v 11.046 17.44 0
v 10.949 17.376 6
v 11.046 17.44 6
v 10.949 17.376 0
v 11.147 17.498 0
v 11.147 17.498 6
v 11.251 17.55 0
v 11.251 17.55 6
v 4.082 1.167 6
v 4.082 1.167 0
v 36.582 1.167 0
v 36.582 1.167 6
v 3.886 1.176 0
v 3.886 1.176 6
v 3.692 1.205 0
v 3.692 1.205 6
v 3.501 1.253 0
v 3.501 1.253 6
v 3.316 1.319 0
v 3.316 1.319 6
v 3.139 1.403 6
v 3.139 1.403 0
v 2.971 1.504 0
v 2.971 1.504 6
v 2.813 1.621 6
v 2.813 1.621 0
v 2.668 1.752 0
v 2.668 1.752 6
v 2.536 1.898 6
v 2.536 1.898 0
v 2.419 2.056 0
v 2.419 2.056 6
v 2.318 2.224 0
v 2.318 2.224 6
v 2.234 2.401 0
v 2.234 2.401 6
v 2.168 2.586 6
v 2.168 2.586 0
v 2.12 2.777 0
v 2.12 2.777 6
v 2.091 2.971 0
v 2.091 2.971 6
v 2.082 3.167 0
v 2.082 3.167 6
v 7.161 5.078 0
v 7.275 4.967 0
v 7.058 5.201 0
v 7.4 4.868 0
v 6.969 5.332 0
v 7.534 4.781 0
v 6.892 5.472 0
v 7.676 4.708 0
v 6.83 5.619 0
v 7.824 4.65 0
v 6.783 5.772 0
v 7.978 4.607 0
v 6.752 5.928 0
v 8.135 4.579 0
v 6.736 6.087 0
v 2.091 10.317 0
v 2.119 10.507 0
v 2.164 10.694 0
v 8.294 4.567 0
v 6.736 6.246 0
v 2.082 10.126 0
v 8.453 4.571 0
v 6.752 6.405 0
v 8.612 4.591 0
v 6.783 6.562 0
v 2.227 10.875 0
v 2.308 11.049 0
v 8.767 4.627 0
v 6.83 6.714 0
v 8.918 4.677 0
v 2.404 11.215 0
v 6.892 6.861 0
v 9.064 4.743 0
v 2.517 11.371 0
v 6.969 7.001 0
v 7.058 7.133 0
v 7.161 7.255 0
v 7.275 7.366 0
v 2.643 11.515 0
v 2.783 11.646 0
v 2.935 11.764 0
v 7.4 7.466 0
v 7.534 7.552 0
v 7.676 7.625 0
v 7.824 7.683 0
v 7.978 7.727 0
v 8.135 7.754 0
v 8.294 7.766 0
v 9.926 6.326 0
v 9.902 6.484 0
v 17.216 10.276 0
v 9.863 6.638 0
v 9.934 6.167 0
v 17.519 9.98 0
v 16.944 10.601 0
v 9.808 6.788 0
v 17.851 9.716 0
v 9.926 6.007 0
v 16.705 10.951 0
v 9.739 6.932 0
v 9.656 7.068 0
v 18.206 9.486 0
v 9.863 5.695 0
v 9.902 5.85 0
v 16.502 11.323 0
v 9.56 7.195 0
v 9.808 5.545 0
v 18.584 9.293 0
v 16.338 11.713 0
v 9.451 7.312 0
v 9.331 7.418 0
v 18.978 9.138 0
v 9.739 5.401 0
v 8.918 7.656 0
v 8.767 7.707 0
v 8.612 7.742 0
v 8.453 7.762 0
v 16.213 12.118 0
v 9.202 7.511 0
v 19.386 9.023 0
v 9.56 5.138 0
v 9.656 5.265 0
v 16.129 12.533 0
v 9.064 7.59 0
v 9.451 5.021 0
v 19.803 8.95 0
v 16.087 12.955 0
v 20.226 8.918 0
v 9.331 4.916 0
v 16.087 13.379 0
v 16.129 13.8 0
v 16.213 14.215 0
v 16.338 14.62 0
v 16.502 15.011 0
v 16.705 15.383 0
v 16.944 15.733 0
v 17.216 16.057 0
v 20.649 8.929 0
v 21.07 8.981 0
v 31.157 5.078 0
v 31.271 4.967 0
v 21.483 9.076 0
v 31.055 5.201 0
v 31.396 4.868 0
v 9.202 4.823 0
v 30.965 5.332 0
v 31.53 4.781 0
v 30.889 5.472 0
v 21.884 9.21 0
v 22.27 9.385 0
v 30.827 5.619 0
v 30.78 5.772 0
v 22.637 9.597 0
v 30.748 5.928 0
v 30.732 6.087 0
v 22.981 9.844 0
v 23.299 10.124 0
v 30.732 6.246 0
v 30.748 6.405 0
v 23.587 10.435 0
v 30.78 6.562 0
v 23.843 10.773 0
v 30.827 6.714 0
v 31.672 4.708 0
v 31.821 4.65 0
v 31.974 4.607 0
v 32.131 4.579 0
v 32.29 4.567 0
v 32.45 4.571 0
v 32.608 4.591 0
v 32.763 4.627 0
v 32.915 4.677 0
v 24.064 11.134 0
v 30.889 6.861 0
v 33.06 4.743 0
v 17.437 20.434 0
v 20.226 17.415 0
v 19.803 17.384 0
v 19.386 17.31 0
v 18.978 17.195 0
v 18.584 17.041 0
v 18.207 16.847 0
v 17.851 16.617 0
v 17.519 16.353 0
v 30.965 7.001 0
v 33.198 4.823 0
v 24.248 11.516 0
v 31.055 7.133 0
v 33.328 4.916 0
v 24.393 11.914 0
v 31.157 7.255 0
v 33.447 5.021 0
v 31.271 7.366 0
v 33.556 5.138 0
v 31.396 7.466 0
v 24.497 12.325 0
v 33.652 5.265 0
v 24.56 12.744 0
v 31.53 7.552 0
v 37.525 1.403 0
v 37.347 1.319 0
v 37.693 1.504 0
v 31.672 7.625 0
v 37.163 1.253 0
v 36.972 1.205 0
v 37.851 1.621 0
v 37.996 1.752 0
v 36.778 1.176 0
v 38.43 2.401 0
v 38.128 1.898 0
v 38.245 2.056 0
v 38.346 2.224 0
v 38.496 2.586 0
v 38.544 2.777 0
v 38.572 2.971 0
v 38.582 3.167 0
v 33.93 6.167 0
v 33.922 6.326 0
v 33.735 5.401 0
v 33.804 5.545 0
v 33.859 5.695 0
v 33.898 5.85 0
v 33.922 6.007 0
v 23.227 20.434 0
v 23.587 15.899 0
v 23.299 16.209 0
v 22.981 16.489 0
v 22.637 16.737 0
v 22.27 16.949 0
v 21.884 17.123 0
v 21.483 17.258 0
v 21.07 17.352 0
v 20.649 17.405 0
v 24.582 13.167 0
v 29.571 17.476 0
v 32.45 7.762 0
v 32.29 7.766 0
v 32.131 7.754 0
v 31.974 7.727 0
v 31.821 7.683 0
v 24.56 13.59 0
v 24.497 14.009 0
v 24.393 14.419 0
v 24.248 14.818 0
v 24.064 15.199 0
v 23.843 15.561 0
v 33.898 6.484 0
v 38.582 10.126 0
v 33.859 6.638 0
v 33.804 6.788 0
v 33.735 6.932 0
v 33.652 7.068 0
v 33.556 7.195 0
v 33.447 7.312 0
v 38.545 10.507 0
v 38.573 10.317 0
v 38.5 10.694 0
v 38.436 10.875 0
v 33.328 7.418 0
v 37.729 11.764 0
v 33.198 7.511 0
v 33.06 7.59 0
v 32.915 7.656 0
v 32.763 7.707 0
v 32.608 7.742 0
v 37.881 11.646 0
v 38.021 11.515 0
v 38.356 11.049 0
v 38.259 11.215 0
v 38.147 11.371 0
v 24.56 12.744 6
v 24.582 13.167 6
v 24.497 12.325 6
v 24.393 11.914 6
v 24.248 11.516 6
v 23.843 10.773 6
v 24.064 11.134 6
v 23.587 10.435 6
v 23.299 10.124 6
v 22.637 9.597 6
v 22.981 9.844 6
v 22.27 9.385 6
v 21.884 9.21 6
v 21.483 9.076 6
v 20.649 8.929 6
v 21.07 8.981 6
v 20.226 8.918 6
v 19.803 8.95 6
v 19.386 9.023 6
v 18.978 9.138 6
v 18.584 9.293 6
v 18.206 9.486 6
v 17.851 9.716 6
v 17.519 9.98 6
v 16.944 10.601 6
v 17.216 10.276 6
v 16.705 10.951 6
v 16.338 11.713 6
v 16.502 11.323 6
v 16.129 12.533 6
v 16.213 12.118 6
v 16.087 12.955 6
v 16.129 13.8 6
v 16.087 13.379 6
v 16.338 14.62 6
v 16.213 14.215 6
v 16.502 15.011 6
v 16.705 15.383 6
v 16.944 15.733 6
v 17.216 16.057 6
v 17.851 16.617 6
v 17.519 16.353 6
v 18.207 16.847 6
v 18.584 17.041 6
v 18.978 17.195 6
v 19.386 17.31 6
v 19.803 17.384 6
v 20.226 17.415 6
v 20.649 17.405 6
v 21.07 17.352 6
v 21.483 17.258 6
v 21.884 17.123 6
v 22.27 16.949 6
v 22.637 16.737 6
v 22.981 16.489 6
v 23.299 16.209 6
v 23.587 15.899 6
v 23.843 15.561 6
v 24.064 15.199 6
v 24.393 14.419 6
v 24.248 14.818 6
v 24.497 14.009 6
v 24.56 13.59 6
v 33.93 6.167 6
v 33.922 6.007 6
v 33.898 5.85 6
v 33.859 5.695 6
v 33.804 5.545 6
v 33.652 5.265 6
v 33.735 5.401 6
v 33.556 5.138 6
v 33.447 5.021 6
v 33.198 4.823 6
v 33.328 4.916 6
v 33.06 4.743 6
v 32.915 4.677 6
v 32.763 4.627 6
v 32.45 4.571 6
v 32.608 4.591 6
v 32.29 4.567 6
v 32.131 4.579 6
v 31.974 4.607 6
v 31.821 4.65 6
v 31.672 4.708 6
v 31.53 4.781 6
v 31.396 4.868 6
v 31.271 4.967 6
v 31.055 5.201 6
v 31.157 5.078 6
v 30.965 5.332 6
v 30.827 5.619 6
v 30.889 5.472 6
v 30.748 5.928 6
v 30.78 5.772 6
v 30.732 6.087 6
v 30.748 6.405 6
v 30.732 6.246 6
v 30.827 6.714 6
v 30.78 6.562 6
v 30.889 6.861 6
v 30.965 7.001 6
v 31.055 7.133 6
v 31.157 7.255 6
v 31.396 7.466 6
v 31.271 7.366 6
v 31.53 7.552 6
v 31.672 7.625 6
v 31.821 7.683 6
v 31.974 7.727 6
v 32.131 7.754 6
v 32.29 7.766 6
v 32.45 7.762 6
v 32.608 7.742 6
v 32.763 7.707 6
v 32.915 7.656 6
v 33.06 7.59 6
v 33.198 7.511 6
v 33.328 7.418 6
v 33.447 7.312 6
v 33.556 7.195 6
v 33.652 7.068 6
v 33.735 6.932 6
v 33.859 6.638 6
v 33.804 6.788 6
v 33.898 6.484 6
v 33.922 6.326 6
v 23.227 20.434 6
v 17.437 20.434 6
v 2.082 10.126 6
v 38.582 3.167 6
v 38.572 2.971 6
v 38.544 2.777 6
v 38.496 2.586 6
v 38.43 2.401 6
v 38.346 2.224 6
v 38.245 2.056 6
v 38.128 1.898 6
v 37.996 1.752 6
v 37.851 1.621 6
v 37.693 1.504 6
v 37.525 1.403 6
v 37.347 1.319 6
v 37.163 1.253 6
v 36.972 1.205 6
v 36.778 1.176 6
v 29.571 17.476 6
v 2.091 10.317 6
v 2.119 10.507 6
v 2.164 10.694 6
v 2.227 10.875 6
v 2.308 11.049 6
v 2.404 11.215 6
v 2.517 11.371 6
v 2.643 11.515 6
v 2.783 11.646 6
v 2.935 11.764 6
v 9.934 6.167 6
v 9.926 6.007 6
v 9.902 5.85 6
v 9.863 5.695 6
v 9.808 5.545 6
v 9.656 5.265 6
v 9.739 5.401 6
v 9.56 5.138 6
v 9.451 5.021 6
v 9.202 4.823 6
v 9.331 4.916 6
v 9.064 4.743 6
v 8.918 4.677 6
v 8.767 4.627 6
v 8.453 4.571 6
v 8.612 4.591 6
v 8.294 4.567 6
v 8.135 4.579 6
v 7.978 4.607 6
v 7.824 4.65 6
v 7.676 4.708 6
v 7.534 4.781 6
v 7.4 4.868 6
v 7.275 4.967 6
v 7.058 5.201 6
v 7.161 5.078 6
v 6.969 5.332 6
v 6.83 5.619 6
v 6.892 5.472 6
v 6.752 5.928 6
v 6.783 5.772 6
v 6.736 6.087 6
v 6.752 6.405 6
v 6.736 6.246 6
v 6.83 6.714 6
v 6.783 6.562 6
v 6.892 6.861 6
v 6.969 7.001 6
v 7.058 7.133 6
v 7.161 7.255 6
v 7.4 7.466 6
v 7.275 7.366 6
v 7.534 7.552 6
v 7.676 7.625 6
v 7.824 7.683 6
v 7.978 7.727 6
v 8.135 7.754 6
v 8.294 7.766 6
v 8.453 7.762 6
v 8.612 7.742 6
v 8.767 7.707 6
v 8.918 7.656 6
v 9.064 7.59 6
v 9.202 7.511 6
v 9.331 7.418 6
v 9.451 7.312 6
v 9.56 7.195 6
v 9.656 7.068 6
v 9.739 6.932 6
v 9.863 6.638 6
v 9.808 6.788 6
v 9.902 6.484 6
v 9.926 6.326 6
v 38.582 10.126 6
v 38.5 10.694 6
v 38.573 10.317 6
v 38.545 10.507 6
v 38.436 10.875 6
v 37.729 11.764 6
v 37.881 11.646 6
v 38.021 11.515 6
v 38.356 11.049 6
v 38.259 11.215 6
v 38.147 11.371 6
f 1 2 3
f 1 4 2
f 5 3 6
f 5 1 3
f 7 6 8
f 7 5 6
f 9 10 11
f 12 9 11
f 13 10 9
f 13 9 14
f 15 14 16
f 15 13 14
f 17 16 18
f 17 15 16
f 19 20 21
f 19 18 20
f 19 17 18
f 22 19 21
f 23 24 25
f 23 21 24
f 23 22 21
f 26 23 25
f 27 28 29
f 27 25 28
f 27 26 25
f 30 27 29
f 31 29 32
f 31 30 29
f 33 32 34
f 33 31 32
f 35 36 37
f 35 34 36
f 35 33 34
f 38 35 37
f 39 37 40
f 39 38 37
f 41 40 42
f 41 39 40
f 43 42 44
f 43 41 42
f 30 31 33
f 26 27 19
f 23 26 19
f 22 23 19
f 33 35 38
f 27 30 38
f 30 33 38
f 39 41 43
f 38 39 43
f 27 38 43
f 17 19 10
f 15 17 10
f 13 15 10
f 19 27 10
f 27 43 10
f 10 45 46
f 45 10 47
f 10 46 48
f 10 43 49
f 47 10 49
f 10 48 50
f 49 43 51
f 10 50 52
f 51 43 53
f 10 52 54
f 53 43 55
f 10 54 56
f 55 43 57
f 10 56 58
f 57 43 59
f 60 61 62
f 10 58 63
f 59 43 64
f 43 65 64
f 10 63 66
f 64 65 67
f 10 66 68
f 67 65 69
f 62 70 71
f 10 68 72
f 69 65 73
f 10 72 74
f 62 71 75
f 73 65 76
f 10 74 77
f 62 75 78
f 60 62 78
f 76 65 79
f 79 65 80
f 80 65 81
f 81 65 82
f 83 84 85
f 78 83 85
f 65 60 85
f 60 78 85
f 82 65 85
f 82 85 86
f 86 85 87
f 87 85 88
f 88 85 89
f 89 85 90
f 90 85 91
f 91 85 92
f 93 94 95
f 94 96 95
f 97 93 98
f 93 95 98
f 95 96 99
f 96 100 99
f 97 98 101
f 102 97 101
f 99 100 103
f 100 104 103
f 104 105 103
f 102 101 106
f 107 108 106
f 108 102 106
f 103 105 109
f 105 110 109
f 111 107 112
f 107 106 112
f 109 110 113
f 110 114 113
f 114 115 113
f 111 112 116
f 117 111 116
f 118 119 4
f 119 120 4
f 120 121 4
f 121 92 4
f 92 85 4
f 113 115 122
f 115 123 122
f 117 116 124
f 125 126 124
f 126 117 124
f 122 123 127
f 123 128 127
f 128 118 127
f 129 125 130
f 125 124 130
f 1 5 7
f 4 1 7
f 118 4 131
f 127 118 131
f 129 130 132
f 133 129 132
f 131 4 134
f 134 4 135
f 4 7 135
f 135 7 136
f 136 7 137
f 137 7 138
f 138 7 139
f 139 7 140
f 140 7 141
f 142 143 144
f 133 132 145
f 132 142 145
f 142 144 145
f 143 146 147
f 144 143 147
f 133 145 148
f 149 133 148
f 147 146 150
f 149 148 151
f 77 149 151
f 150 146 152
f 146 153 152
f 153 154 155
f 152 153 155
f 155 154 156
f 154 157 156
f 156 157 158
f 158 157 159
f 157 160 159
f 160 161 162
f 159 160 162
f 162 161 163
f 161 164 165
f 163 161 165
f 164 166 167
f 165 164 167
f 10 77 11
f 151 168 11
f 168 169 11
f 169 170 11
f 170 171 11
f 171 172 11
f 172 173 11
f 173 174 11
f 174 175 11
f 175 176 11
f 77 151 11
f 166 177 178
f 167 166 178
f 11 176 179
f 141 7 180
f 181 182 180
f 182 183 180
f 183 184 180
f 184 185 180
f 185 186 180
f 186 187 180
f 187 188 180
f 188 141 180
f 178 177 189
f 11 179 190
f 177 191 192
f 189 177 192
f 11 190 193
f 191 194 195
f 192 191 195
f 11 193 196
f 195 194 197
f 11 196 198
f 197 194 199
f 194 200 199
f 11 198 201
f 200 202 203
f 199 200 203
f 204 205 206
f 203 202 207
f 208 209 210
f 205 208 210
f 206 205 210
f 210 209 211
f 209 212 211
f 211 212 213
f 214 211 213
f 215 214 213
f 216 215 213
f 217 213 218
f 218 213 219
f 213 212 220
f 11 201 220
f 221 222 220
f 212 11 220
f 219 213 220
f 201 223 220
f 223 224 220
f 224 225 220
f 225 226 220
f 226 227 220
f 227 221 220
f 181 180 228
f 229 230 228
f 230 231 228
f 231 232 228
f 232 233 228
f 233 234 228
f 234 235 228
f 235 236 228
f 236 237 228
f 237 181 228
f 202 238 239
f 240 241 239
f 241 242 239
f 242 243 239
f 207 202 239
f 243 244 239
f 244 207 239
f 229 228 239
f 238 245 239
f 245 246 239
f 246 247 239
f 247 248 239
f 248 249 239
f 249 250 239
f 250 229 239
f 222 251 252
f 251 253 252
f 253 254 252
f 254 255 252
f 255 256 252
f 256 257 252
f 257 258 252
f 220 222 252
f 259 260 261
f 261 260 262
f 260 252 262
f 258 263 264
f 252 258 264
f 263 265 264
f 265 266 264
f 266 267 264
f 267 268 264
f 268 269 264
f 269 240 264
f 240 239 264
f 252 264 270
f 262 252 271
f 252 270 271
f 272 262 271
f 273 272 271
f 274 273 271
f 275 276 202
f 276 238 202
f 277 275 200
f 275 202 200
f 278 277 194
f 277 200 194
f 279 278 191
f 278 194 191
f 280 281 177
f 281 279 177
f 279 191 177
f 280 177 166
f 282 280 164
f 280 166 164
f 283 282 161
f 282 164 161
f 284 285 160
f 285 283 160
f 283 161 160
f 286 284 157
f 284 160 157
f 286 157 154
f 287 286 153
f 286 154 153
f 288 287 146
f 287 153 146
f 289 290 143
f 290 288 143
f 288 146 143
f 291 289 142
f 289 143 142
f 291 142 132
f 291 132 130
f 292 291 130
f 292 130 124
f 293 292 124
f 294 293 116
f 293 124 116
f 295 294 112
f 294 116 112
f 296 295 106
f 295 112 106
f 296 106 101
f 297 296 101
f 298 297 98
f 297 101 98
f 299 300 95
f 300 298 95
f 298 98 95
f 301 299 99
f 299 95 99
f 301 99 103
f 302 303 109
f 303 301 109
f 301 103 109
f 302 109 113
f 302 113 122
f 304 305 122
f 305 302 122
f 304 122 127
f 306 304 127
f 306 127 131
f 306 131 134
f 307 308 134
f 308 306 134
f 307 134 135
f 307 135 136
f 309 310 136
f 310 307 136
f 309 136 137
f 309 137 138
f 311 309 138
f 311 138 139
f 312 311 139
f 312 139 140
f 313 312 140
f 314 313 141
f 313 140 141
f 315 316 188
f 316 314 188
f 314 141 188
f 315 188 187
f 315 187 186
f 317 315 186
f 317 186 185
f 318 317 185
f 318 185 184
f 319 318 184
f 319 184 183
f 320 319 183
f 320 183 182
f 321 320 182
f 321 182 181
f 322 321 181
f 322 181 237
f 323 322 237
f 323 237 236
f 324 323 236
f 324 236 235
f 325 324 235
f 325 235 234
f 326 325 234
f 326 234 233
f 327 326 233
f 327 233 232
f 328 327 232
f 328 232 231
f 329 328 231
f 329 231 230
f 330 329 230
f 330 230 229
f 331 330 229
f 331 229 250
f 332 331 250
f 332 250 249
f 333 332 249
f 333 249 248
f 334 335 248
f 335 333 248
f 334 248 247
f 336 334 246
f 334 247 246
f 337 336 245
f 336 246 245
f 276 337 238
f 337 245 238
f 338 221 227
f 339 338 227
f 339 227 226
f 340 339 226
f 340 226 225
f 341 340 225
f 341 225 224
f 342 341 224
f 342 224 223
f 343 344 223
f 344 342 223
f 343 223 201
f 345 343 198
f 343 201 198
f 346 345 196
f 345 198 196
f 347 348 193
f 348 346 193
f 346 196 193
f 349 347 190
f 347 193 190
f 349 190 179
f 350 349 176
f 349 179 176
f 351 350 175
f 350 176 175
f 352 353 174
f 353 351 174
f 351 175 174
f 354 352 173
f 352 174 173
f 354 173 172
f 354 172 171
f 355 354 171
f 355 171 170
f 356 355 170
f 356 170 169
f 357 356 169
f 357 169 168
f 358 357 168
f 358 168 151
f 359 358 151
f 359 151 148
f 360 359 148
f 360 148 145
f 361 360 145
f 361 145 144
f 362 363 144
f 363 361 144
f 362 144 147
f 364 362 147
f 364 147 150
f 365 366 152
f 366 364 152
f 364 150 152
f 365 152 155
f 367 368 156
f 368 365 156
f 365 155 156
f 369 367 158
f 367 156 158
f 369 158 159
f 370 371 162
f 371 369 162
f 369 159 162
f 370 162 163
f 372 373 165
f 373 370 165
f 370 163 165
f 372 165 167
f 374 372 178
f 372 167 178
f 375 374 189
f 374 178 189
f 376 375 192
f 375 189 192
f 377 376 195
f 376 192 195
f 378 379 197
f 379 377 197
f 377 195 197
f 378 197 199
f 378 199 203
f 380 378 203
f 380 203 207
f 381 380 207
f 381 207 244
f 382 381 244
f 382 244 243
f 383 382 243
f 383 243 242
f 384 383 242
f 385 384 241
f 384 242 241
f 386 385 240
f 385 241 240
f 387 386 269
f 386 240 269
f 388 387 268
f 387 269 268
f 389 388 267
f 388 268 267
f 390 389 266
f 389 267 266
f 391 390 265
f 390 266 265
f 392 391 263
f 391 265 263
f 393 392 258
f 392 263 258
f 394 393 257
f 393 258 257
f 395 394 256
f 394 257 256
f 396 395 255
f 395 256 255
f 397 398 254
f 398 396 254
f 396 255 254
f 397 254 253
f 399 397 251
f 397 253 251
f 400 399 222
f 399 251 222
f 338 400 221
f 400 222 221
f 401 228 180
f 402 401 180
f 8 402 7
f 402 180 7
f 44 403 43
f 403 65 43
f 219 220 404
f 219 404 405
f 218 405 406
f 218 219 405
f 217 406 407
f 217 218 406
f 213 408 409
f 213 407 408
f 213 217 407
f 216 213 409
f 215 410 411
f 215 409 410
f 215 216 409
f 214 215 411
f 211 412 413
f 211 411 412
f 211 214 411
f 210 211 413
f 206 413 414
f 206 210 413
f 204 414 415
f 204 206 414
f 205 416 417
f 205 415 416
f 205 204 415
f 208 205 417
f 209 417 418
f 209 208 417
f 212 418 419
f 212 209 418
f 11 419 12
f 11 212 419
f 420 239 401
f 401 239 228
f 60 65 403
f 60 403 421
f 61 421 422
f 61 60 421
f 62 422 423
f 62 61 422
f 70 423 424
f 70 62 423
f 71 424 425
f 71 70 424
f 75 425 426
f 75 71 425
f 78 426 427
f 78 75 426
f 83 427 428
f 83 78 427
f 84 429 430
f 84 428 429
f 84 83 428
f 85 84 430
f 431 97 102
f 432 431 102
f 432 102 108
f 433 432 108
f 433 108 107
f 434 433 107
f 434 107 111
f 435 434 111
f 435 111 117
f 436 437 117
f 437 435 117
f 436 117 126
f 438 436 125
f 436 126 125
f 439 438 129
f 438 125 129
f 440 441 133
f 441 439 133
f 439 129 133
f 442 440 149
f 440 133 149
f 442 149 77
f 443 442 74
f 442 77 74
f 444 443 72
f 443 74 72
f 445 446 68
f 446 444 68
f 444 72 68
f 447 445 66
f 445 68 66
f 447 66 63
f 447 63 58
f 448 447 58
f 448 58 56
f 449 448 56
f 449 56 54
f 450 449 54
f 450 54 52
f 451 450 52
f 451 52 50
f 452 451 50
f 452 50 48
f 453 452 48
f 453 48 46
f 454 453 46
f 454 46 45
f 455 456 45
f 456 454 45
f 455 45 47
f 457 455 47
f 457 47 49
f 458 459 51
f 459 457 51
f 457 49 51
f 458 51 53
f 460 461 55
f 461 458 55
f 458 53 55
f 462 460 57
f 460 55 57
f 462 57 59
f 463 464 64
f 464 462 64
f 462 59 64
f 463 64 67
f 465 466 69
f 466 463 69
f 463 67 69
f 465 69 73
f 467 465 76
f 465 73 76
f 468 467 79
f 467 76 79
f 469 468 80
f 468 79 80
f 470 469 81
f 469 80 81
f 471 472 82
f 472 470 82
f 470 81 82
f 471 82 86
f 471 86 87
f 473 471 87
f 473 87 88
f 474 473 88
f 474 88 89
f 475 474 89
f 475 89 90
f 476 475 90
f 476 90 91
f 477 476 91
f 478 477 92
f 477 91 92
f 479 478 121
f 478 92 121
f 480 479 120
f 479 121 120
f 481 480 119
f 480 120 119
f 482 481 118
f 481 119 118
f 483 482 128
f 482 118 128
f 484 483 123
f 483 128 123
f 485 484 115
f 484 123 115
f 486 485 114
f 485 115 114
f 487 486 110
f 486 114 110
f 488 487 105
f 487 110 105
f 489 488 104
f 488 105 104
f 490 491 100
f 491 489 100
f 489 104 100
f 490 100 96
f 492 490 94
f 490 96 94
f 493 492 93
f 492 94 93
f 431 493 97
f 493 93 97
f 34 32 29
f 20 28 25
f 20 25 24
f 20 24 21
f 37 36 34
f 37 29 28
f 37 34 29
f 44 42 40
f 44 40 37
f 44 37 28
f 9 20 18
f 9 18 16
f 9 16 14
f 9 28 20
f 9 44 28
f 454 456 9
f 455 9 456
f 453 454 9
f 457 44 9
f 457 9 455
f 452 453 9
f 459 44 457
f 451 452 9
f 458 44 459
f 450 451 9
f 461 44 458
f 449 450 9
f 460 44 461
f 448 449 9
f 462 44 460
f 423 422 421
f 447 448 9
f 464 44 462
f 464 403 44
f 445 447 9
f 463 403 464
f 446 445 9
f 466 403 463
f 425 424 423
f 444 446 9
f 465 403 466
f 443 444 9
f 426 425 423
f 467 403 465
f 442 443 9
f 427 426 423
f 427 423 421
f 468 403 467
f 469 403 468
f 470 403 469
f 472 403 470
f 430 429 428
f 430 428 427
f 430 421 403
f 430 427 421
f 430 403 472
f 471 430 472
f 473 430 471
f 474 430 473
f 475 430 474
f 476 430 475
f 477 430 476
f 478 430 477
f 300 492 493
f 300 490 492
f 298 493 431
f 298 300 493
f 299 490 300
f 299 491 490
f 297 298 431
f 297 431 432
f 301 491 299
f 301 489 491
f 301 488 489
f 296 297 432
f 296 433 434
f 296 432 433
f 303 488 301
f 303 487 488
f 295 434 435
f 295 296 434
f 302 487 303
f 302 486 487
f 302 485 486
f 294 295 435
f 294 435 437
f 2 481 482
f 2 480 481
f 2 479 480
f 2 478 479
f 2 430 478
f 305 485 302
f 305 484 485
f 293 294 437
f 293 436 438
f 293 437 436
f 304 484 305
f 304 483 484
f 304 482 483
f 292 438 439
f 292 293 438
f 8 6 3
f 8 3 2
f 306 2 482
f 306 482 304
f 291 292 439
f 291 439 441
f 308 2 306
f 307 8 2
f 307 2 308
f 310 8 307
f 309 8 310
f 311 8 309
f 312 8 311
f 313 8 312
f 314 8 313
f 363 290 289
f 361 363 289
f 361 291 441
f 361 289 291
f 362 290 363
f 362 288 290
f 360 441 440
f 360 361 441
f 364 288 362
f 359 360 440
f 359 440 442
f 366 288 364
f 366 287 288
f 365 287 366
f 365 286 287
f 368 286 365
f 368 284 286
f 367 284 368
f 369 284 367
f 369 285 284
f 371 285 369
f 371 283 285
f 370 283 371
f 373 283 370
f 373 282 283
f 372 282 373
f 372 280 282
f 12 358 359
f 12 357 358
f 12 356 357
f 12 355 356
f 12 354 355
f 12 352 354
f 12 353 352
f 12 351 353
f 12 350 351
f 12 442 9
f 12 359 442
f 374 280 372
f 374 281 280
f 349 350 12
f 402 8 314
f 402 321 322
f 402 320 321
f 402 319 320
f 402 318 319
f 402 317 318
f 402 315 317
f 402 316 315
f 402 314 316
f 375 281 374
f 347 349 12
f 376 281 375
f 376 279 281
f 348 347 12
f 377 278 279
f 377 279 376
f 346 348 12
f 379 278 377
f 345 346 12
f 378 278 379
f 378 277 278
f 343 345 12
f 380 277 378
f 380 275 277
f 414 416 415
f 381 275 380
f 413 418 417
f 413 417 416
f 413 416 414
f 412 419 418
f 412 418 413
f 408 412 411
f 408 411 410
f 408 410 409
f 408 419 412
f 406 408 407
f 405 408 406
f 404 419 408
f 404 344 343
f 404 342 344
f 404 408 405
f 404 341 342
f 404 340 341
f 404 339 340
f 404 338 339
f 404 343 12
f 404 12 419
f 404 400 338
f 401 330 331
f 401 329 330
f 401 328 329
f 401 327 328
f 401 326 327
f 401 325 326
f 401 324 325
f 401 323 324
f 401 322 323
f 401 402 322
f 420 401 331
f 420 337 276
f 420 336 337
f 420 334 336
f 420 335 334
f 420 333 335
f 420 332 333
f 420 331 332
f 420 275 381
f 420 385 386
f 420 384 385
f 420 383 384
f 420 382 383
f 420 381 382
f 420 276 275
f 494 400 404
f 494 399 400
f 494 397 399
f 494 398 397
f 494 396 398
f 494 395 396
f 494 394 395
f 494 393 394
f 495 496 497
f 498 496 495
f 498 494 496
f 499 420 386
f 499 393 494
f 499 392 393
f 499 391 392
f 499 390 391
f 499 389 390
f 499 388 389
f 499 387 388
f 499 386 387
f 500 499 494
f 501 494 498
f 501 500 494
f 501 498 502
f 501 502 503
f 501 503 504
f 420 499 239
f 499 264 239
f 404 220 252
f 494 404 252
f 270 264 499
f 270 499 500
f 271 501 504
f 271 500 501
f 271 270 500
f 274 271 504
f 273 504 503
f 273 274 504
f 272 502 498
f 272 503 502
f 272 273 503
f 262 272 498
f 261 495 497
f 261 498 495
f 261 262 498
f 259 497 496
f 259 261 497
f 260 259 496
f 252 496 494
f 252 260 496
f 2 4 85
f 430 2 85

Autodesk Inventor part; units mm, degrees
ref_plane "YZ Plane" through (0, 0, 0) normal (1, 0, 0) x (0, 1, 0)
ref_plane "XZ Plane" through (0, 0, 0) normal (0, 1, 0) x (-1, 0, 0)
ref_plane "XY Plane" through (0, 0, 0) normal (0, 0, 1) x (1, 0, 0)
sketch "Sketch1" plane through (0, 0, 0) normal (0, 0, 1) x (1, 0, 0)
  line L0 (37.7292, 11.7639) -> (29.5714, 17.4761)
  line L1 (29.5714, 17.4761) -> (23.2272, 20.4344)
  line L2 (23.2272, 20.4344) -> (17.4366, 20.4344)
  line L3 (17.4366, 20.4344) -> (11.251, 17.55)
  arc A0 (11.251, 17.55) -> (10.9491, 17.3757) centre (12.0963, 15.7374) ccw
  line L4 (10.9491, 17.3757) -> (2.9346, 11.7639)
  arc A1 (2.9346, 11.7639) -> (2.0818, 10.1256) centre (4.0818, 10.1256) ccw
  line L5 (2.0818, 10.1256) -> (2.0818, 3.1667)
  arc A2 (2.0818, 3.1667) -> (4.0818, 1.1667) centre (4.0818, 3.1667) ccw
  line L6 (4.0818, 1.1667) -> (36.5821, 1.1667)
  arc A3 (36.5821, 1.1667) -> (38.5821, 3.1667) centre (36.5821, 3.1667) ccw
  line L7 (38.5821, 3.1667) -> (38.5821, 10.1256)
  arc A4 (38.5821, 10.1256) -> (37.7292, 11.7639) centre (36.5821, 10.1256) ccw
  circle A5 centre (8.3339, 6.1667) radius 1.6
  circle A6 centre (32.3301, 6.1667) radius 1.6
  circle A7 centre (20.3315, 13.1667) radius 4.25
  point P0 (0, 0)
extrude "Extrusion1" add sketch "Sketch1" along normal blind 6
thread "Thread1" size "M9x1.25" class "6H" standard "ANSI Metric M Profile" full length
properties part number "pshfit-mount-acrylic"
